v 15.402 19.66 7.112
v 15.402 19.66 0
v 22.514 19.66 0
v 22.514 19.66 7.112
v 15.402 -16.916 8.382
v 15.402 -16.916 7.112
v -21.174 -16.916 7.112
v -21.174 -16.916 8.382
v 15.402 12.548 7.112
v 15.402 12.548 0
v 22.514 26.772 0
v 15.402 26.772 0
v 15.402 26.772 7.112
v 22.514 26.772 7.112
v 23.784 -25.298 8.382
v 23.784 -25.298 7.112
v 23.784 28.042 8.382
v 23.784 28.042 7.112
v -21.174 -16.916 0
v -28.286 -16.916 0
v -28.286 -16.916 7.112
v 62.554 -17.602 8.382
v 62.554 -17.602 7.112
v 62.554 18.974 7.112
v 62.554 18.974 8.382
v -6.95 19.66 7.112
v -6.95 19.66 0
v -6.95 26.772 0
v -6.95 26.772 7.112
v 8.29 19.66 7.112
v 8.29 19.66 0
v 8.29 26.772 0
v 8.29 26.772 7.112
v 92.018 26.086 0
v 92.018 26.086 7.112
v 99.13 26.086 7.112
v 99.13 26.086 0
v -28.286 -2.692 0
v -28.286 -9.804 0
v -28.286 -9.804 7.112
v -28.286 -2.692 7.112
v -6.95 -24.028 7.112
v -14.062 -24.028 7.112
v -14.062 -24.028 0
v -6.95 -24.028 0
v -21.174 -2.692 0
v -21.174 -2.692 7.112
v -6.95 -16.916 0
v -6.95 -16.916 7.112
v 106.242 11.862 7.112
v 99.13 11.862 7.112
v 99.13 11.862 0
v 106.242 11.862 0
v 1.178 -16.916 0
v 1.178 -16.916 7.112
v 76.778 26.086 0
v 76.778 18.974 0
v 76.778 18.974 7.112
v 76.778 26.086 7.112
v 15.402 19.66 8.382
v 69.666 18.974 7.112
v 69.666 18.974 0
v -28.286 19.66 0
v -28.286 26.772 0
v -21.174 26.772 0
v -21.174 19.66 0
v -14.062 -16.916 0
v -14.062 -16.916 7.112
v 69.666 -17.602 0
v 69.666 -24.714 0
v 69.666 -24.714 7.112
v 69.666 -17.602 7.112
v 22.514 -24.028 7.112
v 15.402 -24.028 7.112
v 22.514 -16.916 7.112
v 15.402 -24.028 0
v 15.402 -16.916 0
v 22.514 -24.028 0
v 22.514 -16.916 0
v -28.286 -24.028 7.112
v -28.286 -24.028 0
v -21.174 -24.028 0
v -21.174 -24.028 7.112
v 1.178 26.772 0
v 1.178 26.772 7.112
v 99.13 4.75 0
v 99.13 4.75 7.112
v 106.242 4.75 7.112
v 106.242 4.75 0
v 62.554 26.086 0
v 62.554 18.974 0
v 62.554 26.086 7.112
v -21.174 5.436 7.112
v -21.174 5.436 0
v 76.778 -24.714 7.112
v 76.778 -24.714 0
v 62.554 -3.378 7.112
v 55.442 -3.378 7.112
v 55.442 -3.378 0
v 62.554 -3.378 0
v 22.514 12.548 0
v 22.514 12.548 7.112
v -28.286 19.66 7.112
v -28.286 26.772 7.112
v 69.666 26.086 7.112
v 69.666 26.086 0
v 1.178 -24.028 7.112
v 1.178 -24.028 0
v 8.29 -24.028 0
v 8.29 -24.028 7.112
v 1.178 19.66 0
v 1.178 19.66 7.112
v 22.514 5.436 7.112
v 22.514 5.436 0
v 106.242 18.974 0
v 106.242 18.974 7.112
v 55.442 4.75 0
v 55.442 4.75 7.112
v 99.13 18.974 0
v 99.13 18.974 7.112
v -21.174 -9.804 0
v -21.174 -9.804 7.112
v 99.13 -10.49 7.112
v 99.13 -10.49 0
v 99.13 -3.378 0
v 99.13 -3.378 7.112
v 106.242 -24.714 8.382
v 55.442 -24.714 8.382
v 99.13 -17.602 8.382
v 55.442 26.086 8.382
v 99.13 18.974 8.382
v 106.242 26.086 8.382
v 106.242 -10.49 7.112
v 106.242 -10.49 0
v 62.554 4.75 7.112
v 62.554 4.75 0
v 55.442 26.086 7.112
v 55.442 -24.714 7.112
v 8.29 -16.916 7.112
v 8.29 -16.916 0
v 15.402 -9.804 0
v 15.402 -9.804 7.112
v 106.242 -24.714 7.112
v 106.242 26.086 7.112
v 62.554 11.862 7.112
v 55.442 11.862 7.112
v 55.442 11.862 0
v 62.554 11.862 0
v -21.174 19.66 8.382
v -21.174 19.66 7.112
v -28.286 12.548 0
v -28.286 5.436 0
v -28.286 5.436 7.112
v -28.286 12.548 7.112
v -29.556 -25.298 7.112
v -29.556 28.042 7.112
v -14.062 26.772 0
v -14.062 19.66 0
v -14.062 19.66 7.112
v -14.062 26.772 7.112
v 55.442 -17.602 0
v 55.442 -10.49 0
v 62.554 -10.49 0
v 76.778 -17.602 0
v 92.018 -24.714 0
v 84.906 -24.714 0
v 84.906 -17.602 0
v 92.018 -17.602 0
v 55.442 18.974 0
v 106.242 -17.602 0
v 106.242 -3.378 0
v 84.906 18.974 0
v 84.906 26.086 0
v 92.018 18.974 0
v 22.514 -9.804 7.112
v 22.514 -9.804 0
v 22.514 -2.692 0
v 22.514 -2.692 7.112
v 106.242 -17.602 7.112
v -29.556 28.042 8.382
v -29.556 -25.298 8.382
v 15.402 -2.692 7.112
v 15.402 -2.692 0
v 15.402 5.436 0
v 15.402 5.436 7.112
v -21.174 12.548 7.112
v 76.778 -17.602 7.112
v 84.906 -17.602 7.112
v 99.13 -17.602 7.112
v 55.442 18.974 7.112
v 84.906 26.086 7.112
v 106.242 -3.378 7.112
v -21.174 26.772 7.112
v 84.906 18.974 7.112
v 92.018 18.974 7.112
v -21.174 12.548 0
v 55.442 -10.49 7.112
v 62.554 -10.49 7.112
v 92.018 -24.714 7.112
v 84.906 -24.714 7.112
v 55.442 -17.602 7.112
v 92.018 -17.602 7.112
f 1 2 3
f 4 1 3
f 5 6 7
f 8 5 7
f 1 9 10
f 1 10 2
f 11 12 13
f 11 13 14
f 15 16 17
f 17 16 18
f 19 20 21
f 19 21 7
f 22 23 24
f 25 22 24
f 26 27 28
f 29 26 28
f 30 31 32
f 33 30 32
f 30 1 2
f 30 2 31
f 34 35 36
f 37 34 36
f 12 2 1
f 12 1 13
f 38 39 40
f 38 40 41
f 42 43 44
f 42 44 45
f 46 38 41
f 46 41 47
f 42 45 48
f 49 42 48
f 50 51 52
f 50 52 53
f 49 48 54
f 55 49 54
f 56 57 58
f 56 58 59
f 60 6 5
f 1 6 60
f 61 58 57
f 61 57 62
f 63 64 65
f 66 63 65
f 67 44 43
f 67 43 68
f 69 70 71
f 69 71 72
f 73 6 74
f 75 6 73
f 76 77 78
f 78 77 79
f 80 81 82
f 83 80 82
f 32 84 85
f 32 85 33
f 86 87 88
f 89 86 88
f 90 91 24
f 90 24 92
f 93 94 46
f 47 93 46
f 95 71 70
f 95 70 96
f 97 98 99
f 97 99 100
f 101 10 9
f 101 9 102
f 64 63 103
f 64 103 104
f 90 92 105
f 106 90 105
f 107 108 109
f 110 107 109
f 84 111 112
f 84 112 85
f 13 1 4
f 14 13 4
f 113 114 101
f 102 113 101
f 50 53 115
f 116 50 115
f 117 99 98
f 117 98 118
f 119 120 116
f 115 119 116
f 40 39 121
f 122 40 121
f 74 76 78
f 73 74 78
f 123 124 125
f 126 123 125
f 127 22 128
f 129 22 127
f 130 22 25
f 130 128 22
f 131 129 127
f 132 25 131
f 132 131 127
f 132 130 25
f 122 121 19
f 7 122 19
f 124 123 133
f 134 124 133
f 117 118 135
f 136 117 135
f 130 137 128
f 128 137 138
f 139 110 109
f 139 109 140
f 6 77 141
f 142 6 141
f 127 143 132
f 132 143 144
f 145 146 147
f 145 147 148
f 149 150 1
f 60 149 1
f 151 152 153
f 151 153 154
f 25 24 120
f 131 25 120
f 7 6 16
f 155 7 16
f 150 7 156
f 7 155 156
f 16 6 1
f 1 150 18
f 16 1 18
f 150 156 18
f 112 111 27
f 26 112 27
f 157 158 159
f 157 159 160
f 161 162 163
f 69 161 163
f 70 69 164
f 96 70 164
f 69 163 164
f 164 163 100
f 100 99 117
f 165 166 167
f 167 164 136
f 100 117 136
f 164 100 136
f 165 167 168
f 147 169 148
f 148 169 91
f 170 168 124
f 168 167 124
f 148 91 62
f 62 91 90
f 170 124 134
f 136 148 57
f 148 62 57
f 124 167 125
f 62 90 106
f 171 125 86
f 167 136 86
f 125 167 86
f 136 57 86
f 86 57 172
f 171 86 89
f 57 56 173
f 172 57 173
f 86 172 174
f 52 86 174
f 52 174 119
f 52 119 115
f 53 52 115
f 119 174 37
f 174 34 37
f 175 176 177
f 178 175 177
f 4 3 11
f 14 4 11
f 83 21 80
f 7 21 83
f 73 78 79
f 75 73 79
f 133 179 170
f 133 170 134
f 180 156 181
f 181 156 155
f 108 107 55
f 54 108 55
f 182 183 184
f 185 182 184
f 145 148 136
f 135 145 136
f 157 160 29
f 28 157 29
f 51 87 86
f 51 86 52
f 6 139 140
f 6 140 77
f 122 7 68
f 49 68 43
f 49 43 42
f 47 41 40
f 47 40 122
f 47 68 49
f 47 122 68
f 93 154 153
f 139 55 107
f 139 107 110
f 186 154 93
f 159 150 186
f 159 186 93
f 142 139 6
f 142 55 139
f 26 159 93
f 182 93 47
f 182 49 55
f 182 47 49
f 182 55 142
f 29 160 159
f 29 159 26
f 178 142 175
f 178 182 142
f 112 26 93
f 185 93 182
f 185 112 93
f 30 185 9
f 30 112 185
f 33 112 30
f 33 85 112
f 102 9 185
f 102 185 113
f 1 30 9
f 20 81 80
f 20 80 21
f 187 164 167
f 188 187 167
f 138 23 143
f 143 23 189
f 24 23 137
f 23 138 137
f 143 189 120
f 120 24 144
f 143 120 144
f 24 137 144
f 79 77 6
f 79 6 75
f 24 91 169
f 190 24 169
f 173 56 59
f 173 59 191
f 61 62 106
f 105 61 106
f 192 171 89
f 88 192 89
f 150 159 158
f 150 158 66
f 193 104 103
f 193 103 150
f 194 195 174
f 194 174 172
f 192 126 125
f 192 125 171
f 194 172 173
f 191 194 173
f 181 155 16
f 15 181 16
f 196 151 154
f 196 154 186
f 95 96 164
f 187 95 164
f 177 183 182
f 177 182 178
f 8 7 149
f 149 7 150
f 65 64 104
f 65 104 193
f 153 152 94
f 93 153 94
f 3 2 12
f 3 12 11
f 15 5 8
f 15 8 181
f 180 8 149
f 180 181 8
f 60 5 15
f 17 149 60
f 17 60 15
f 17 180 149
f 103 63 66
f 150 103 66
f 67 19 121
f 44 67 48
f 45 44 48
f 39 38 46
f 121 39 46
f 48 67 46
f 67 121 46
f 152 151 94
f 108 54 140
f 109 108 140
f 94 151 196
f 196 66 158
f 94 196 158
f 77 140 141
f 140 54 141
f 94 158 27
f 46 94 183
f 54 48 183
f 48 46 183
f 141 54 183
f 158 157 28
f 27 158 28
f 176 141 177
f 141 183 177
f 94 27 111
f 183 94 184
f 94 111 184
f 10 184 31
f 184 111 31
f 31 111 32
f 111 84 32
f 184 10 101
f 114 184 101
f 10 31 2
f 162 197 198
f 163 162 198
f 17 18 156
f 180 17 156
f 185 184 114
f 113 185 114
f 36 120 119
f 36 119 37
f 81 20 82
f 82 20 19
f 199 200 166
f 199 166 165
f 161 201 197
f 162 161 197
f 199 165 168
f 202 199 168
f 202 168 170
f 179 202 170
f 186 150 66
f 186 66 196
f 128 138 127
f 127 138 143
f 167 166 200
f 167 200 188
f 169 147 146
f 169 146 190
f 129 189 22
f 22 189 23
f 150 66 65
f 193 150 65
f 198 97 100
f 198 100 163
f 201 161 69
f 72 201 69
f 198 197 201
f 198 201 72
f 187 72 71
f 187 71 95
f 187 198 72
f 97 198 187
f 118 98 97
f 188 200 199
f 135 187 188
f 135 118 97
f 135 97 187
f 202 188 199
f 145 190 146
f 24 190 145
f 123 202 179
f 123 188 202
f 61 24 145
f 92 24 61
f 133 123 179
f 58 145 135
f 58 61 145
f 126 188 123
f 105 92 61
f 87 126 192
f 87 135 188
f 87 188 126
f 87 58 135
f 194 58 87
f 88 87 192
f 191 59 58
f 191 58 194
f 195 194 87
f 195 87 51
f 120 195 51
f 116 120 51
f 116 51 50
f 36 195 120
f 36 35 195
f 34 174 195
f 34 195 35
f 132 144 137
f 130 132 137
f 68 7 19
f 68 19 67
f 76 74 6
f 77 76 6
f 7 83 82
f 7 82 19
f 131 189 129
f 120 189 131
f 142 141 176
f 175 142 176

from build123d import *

# Parameters (mm, degrees)
F0_W     = 7.112
F0_H     = 7.112
F0_W_2   = 8.128
F0_H_2   = 8.128
F1_DEPTH = 7.112
F2_W     = 8.382
F2_H     = 8.382
F2_W_2   = 36.576
F2_H_2   = 36.576
F3_DEPTH = 1.27
F4_W     = 7.112
F4_H     = 7.112
F4_W_2   = 36.576
F4_H_2   = 36.576
F5_DEPTH = 1.27


with BuildPart() as f1:
    # F0 (on Top) → F1 (new body)
    with BuildSketch(Plane.XY):
        with Locations((-24.729722, 23.215602)):
            Rectangle(F0_W, F0_H)
        with Locations((-10.505722, 23.215602)):
            Rectangle(F0_W, F0_H)
        with Locations((4.734278, 23.215602)):
            Rectangle(F0_W, F0_H)
        with Locations((18.958278, 23.215602)):
            Rectangle(F0_W, F0_H)
        with Locations((18.958278, 8.991602)):
            Rectangle(F0_W, F0_H)
        with Locations((18.958278, -6.248398)):
            Rectangle(F0_W, F0_H)
        with Locations((18.958278, -20.472398)):
            Rectangle(F0_W, F0_H)
        with Locations((4.734278, -20.472398)):
            Rectangle(F0_W, F0_H)
        Polygon((-14.061722, 19.659602), (-21.173722, 19.659602), (-21.173722, 12.547602), (-21.173722, 5.435602), (-21.173722, -2.692398), (-21.173722, -9.804398), (-21.173722, -16.916398), (-14.061722, -16.916398), (-6.949722, -16.916398), (1.178278, -16.916398), (8.290278, -16.916398), (15.402278, -16.916398), (15.402278, -9.804398), (15.402278, -2.692398), (15.402278, 5.435602), (15.402278, 12.547602), (15.402278, 19.659602), (8.290278, 19.659602), (1.178278, 19.659602), (-6.949722, 19.659602), align=None)
        with Locations((-10.505722, -20.472398)):
            Rectangle(F0_W, F0_H)
        with Locations((-24.729722, -20.472398)):
            Rectangle(F0_W, F0_H)
        with Locations((-24.729722, -6.248398)):
            Rectangle(F0_W, F0_H)
        with Locations((-24.729722, 8.991602)):
            Rectangle(F0_W, F0_H)
        Polygon((69.665864, 18.974437), (62.553864, 18.974437), (62.553864, 11.862437), (62.553864, 4.750437), (62.553864, -3.377563), (62.553864, -10.489563), (62.553864, -17.601563), (69.665864, -17.601563), (76.777864, -17.601563), (84.905864, -17.601563), (92.017864, -17.601563), (99.129864, -17.601563), (99.129864, -10.489563), (99.129864, -3.377563), (99.129864, 4.750437), (99.129864, 11.862437), (99.129864, 18.974437), (92.017864, 18.974437), (84.905864, 18.974437), (76.777864, 18.974437), align=None)
        with Locations((95.573864, 22.530437)):
            Rectangle(F0_W, F0_H)
        with Locations((80.841864, 22.530437)):
            Rectangle(F0_W_2, F0_H)
        with Locations((58.997864, 15.418437)):
            Rectangle(F0_W, F0_H)
        with Locations((58.997864, 0.686437)):
            Rectangle(F0_W, F0_H_2)
        with Locations((102.685864, -14.045563)):
            Rectangle(F0_W, F0_H)
        with Locations((102.685864, 0.686437)):
            Rectangle(F0_W, F0_H_2)
        with Locations((58.997864, -14.045563)):
            Rectangle(F0_W, F0_H)
        with Locations((102.685864, 15.418437)):
            Rectangle(F0_W, F0_H)
        with Locations((66.109864, 22.530437)):
            Rectangle(F0_W, F0_H)
        with Locations((73.221864, -21.157563)):
            Rectangle(F0_W, F0_H)
        with Locations((88.461864, -21.157563)):
            Rectangle(F0_W, F0_H)
    extrude(amount=F1_DEPTH)


with BuildPart() as f3:
    # F2 (on face) → F3 (new body)
    with BuildSketch(Plane.XY.offset(7.112)):
        with Locations((-25.364722, -21.107398)):
            Rectangle(F2_W, F2_H)
        with Locations((-2.885722, -21.107398)):
            Rectangle(F2_W_2, F2_H)
        with Locations((-25.364722, 1.371602)):
            Rectangle(F2_W, F2_H_2)
        with Locations((19.593278, -21.107398)):
            Rectangle(F2_W, F2_H)
        with Locations((-25.364722, 23.850602)):
            Rectangle(F2_W, F2_H)
        with Locations((19.593278, 1.371602)):
            Rectangle(F2_W, F2_H_2)
        with Locations((-2.885722, 23.850602)):
            Rectangle(F2_W_2, F2_H)
        with Locations((19.593278, 23.850602)):
            Rectangle(F2_W, F2_H)
    extrude(amount=F3_DEPTH)


with BuildPart() as f5:
    # F4 (on face) → F5 (new body)
    with BuildSketch(Plane.XY.offset(7.112)):
        with Locations((58.997864, -21.157563)):
            Rectangle(F4_W, F4_H)
        with Locations((80.841864, -21.157563)):
            Rectangle(F4_W_2, F4_H)
        with Locations((58.997864, 0.686437)):
            Rectangle(F4_W, F4_H_2)
        with Locations((102.685864, -21.157563)):
            Rectangle(F4_W, F4_H)
        with Locations((58.997864, 22.530437)):
            Rectangle(F4_W, F4_H)
        with Locations((80.841864, 22.530437)):
            Rectangle(F4_W_2, F4_H)
        with Locations((102.685864, 0.686437)):
            Rectangle(F4_W, F4_H_2)
        with Locations((102.685864, 22.530437)):
            Rectangle(F4_W, F4_H)
    extrude(amount=F5_DEPTH)


solid = Compound([f1.part, f3.part, f5.part])
